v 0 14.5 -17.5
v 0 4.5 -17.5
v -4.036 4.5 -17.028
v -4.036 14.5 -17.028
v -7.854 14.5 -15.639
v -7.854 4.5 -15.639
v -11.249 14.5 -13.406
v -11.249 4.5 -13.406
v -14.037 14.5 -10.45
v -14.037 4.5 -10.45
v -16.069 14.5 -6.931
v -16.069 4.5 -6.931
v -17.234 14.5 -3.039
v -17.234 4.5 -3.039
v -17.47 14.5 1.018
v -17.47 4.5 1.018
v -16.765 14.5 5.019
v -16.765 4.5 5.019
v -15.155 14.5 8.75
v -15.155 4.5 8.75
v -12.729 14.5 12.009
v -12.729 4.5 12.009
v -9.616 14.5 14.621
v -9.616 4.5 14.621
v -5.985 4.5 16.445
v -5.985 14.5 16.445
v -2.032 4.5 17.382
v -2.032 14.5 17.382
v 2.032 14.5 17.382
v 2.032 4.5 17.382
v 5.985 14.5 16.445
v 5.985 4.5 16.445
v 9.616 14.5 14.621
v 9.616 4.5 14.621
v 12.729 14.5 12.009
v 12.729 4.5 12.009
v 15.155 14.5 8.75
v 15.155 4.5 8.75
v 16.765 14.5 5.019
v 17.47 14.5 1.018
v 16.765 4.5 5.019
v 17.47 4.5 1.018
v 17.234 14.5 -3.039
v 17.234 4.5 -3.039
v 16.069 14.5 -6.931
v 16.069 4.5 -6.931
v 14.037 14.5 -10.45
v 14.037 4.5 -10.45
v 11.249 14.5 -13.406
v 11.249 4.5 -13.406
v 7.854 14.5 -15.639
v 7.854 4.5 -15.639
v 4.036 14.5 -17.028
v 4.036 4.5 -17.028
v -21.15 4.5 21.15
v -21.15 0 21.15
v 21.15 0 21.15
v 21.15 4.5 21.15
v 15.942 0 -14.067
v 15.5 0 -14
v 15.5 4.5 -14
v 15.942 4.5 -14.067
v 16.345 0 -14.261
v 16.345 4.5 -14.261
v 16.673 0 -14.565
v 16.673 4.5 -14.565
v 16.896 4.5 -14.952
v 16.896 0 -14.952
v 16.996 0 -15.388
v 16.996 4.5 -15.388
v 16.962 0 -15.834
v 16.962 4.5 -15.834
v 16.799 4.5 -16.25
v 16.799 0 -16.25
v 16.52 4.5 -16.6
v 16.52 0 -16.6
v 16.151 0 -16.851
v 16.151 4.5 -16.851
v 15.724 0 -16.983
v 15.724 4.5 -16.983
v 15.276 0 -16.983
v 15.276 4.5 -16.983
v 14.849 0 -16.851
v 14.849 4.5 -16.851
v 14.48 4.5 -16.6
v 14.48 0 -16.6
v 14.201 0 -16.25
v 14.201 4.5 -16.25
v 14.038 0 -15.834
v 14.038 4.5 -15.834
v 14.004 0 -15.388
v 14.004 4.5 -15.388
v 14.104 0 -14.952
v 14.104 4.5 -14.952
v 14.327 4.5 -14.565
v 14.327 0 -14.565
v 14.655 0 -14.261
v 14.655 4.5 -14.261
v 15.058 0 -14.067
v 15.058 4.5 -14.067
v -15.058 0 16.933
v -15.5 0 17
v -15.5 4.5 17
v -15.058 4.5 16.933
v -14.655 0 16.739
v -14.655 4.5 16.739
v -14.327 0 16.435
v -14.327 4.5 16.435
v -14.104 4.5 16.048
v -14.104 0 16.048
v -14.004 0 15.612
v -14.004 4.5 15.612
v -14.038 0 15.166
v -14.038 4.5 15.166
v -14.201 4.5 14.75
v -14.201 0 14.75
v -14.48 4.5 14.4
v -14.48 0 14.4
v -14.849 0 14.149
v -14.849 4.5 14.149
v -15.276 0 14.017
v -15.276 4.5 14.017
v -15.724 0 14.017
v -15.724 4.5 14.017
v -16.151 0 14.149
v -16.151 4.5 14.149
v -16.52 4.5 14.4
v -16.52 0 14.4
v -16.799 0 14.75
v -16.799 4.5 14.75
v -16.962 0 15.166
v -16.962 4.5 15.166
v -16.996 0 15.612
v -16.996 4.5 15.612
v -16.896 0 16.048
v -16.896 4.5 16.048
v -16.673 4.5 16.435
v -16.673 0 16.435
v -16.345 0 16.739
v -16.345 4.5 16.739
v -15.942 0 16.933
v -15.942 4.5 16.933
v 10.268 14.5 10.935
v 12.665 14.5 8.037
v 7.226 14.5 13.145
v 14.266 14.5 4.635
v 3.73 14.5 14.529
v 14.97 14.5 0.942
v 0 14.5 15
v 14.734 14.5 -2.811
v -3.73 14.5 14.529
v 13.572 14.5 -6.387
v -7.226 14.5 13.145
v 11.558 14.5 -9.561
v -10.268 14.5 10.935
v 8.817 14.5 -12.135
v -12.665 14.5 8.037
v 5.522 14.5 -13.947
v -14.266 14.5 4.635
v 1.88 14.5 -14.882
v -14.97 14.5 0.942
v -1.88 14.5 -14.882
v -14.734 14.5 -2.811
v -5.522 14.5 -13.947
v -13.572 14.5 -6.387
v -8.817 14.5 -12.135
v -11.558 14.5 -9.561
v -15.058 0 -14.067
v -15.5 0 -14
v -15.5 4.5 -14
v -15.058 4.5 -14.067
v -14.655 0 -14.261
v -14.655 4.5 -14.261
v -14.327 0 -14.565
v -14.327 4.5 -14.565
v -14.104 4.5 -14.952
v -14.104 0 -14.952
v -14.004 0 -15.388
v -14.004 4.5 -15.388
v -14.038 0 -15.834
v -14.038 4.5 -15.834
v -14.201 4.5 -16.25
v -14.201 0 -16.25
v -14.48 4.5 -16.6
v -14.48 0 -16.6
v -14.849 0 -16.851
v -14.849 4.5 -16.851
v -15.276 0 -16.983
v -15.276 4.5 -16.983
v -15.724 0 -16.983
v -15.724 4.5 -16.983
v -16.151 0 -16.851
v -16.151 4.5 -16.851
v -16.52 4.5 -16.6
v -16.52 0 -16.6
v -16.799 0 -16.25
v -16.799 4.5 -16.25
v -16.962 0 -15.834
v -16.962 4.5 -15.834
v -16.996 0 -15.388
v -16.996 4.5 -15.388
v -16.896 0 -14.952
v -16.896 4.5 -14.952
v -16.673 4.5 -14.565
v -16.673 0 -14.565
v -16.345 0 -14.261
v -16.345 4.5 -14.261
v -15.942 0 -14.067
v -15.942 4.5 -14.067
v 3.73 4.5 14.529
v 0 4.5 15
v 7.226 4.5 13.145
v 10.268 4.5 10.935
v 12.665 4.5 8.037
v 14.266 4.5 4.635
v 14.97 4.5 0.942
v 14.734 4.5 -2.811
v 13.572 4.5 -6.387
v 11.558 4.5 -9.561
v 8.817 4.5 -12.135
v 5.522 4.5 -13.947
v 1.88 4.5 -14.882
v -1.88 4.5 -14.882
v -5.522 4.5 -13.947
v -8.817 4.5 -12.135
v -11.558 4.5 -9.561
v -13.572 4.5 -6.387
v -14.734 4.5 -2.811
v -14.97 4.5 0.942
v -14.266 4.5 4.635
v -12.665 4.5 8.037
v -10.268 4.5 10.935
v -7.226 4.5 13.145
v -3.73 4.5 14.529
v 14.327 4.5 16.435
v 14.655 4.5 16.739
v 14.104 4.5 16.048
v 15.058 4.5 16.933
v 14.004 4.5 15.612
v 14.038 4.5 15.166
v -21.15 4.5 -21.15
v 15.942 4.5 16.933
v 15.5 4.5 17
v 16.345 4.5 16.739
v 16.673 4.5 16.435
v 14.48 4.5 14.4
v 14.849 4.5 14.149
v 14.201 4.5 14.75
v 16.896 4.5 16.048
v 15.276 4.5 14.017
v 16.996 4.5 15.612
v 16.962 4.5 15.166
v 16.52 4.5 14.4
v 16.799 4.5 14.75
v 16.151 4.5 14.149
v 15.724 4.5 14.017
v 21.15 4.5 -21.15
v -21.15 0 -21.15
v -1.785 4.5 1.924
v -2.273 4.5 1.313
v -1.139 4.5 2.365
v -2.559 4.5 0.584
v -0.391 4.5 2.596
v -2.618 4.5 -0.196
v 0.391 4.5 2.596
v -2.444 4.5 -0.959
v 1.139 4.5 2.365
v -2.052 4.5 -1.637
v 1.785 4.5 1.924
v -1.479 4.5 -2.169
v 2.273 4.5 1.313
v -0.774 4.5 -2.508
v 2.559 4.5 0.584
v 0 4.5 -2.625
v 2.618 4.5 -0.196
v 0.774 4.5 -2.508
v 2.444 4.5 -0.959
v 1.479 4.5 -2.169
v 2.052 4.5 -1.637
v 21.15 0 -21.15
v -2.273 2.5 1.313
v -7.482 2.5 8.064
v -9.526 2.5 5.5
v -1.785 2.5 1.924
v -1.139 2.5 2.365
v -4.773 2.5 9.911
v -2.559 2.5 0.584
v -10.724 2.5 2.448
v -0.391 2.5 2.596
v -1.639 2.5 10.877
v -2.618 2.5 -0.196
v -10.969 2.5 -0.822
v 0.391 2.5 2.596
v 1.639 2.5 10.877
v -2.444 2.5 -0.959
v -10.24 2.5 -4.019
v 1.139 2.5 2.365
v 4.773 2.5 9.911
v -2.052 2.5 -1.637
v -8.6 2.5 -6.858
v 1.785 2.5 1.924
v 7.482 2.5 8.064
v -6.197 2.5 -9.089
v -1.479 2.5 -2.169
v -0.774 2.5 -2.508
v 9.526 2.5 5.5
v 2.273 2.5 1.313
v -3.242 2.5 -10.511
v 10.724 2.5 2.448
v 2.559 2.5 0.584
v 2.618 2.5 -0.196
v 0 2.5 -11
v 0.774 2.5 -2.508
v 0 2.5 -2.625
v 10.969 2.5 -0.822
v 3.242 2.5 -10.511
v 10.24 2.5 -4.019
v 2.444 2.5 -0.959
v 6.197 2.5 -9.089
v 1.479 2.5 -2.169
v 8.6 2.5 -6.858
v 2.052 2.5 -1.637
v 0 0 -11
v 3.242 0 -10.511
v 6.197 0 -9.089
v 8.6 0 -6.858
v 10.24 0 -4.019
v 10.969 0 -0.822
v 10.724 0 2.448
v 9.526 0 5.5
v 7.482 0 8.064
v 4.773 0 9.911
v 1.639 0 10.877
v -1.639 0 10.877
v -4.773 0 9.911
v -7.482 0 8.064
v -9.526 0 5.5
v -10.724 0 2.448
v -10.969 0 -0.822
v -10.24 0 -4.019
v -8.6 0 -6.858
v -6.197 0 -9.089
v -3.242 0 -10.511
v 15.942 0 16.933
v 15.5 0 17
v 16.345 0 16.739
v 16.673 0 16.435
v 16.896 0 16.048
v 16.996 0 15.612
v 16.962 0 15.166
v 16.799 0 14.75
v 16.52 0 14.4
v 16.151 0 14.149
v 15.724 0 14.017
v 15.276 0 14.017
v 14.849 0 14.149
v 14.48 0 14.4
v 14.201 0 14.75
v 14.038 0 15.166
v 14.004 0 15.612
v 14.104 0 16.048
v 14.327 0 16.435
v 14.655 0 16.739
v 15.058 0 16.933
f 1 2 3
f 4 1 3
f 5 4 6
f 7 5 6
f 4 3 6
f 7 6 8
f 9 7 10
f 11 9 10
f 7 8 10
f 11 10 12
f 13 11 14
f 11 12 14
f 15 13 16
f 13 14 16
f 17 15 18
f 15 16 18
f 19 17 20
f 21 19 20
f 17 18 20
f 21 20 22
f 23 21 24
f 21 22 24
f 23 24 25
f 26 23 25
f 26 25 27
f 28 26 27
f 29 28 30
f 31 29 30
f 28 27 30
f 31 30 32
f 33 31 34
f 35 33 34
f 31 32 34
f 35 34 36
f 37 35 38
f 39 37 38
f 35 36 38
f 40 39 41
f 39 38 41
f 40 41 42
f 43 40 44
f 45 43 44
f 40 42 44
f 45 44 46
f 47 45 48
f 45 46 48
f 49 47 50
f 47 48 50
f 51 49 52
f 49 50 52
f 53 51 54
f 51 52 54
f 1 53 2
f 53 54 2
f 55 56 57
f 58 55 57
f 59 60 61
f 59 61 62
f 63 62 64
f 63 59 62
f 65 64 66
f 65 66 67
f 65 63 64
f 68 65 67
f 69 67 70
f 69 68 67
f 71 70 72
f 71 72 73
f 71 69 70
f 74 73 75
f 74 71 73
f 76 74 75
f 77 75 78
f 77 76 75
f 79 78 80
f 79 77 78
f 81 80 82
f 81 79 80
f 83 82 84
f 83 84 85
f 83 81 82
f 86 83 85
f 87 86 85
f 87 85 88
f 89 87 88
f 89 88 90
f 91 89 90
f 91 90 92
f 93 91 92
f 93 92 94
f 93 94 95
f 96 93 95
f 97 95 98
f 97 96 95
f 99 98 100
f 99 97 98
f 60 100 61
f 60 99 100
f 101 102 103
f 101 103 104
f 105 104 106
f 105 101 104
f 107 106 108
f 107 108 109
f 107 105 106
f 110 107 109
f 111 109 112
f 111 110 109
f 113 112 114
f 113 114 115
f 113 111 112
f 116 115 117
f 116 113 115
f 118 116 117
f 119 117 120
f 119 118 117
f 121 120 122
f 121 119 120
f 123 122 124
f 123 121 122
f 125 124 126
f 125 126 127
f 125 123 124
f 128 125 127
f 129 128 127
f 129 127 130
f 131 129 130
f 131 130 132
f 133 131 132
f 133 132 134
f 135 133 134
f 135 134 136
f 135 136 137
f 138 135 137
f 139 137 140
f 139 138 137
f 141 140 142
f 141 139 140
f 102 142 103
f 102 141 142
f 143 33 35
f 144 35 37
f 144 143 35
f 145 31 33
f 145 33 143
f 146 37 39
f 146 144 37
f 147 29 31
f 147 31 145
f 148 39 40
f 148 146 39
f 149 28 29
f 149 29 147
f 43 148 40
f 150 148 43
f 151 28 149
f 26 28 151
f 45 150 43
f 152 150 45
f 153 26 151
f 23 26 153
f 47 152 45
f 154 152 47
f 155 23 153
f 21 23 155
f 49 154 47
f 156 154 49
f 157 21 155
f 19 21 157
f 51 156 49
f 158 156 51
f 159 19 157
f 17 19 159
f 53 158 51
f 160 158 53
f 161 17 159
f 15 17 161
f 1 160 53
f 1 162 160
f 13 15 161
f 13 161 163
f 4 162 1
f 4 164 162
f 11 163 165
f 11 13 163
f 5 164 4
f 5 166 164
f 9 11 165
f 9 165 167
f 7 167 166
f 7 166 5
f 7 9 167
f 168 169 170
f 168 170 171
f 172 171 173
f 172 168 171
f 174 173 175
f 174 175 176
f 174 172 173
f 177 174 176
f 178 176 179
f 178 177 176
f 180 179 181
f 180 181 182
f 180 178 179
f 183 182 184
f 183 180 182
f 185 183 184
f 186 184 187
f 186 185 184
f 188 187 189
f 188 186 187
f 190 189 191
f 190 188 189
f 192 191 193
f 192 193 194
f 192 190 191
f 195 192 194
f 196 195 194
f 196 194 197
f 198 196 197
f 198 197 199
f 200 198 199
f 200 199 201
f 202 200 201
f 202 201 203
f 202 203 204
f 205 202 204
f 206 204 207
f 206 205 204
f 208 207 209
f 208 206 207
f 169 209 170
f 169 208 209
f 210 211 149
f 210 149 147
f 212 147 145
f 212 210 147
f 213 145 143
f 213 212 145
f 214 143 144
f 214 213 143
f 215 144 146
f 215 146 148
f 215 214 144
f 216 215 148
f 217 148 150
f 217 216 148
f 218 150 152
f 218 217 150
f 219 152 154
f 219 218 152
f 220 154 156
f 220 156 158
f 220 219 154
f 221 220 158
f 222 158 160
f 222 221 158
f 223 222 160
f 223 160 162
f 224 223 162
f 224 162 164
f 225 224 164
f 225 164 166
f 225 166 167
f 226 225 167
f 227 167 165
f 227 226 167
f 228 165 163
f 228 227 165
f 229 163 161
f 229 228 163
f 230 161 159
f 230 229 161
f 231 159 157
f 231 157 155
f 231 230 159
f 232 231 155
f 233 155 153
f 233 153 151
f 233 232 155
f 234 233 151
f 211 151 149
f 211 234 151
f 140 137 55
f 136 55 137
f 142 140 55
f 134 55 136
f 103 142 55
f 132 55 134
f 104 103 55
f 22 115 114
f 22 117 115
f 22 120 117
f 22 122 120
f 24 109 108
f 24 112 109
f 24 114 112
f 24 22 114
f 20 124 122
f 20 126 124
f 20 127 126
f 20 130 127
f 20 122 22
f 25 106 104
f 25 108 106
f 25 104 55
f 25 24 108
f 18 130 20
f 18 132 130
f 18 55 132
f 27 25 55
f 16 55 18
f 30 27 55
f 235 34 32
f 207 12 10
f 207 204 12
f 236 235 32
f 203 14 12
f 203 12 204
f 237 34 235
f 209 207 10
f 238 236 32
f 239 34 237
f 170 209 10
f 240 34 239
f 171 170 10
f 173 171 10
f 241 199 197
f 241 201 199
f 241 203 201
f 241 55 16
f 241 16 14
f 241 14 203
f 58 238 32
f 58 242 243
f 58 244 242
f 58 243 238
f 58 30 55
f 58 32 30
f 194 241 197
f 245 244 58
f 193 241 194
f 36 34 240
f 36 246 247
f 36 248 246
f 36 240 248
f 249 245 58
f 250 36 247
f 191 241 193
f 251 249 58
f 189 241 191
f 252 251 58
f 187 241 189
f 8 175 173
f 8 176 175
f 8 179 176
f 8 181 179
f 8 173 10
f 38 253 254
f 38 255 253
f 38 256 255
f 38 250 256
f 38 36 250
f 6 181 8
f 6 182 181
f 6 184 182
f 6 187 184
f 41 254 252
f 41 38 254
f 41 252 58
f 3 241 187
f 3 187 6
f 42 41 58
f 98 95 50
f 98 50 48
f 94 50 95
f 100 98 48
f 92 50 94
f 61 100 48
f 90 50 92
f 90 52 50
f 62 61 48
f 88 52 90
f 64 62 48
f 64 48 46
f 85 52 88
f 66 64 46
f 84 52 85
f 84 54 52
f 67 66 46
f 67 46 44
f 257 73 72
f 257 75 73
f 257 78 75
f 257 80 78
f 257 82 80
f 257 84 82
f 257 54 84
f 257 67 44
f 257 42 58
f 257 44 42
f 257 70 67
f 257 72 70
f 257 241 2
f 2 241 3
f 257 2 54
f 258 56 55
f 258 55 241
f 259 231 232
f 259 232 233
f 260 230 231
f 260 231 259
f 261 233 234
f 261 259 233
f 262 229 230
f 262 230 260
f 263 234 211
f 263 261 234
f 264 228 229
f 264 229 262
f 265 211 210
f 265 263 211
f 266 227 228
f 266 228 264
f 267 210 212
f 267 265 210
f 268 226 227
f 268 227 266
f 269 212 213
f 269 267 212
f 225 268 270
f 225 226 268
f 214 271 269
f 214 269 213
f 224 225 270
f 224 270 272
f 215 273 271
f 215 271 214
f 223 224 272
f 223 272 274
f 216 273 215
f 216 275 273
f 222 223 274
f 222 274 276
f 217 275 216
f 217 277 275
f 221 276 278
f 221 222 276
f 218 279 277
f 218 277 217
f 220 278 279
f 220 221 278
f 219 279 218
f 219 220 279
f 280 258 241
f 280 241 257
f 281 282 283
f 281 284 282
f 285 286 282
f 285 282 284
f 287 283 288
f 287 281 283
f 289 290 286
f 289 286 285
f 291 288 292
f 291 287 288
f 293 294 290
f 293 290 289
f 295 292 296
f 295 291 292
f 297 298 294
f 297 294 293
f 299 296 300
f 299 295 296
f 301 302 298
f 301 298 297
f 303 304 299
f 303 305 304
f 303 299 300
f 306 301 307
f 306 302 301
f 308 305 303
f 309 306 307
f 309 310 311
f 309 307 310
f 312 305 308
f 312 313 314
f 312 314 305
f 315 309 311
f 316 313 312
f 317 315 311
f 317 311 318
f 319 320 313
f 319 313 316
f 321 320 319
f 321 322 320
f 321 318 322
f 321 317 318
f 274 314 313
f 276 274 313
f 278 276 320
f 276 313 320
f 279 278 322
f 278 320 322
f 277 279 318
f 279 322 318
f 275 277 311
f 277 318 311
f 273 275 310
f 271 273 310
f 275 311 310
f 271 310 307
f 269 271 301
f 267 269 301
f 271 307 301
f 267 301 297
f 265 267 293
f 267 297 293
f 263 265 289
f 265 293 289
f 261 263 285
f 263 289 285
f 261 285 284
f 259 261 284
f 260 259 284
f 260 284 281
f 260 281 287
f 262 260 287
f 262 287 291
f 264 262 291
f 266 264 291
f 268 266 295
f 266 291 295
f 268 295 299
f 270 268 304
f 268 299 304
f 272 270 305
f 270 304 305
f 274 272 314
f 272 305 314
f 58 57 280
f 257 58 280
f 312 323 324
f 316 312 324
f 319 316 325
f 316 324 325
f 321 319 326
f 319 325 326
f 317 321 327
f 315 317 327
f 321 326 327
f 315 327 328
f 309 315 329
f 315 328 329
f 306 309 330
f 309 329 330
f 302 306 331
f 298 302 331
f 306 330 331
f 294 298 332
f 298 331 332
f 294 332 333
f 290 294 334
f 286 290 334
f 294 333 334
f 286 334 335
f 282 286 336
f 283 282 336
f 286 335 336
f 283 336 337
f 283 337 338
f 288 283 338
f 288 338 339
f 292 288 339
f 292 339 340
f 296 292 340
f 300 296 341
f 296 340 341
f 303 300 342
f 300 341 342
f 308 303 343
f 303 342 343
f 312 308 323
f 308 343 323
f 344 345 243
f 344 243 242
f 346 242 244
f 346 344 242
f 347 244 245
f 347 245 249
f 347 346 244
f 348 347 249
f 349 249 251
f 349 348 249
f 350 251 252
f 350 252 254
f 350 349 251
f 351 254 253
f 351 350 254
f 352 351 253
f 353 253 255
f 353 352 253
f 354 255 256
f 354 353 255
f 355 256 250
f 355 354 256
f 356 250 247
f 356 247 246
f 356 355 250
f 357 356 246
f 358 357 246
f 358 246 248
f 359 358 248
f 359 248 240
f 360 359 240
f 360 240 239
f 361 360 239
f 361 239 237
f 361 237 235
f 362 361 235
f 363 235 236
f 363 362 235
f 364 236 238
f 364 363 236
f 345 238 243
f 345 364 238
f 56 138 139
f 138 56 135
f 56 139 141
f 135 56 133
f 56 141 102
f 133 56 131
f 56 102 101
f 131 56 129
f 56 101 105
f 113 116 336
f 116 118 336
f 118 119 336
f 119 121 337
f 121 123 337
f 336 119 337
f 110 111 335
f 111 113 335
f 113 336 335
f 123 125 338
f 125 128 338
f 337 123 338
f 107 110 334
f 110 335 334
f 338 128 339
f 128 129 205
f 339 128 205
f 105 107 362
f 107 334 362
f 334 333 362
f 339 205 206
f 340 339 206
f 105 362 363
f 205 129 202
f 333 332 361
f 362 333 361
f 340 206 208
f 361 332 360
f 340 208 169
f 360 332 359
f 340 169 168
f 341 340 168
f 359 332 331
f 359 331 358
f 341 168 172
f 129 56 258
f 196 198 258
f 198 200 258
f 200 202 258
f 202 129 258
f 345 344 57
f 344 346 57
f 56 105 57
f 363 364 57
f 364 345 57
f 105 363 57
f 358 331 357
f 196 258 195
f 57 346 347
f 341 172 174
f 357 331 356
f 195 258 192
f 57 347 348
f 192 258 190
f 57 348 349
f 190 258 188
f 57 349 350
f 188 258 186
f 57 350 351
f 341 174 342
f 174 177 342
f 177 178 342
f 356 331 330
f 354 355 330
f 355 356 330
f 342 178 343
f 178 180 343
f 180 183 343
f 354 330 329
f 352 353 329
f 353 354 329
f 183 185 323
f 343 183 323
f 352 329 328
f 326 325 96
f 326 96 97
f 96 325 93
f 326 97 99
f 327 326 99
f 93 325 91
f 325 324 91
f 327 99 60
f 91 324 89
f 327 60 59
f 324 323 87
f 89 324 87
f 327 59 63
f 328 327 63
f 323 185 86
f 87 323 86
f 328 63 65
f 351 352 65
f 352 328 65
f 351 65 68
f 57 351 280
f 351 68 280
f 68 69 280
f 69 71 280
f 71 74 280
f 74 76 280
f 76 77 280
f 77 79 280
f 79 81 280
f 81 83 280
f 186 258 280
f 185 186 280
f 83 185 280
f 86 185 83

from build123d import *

# Parameters (mm, degrees)
SKETCH1_W           = 42.3
SKETCH1_H           = 42.3
SKETCH1_R           = 1.5
BOSS_EXTRUDE1_DEPTH = 4.5
SKETCH2_R           = 11
CUT_EXTRUDE1_DEPTH  = 2.5
SKETCH3_R           = 2.625
CUT_EXTRUDE2_DEPTH  = 2
SKETCH4_R           = 17.5
SKETCH4_R_2         = 15
BOSS_EXTRUDE2_DEPTH = 10


with BuildPart() as part:
    # Sketch1 → Boss-Extrude1 (new body)
    with BuildSketch(Plane(origin=(0, 0, 0), x_dir=(1, 0, 0), z_dir=(0, 1, 0))):
        Rectangle(SKETCH1_W, SKETCH1_H)
        with Locations(Location((-15.5, 15.5, 0), (0, 0, 270))):
            Circle(SKETCH1_R, mode=Mode.SUBTRACT)
        with Locations(Location((15.5, 15.5, 0), (0, 0, 270))):
            Circle(SKETCH1_R, mode=Mode.SUBTRACT)
        with Locations(Location((-15.5, -15.5, 0), (0, 0, 270))):
            Circle(SKETCH1_R, mode=Mode.SUBTRACT)
        with Locations(Location((15.5, -15.5, 0), (0, 0, 270))):
            Circle(SKETCH1_R, mode=Mode.SUBTRACT)
    extrude(amount=BOSS_EXTRUDE1_DEPTH)

    # Sketch2 → Cut-Extrude1 (cut)
    with BuildSketch(Plane.XZ):
        with Locations(Location((0, 0, 0), (0, 0, 270))):
            Circle(SKETCH2_R)
    extrude(amount=-CUT_EXTRUDE1_DEPTH, mode=Mode.SUBTRACT)

    # Sketch3 → Cut-Extrude2 (cut)
    with BuildSketch(Plane.XZ.offset(-2.5)):
        with Locations(Location((0, 0, 0), (0, 0, 270))):
            Circle(SKETCH3_R)
    extrude(amount=-CUT_EXTRUDE2_DEPTH, mode=Mode.SUBTRACT)

    # Sketch4 → Boss-Extrude2 (add)
    with BuildSketch(Plane(origin=(0, 4.5, 0), x_dir=(1, 0, 0), z_dir=(0, 1, 0))):
        with Locations(Location((0, 0, 0), (0, 0, 90))):
            Circle(SKETCH4_R)
        with Locations(Location((0, 0, 0), (0, 0, 270))):
            Circle(SKETCH4_R_2, mode=Mode.SUBTRACT)
    extrude(amount=BOSS_EXTRUDE2_DEPTH)


solid = part.part
